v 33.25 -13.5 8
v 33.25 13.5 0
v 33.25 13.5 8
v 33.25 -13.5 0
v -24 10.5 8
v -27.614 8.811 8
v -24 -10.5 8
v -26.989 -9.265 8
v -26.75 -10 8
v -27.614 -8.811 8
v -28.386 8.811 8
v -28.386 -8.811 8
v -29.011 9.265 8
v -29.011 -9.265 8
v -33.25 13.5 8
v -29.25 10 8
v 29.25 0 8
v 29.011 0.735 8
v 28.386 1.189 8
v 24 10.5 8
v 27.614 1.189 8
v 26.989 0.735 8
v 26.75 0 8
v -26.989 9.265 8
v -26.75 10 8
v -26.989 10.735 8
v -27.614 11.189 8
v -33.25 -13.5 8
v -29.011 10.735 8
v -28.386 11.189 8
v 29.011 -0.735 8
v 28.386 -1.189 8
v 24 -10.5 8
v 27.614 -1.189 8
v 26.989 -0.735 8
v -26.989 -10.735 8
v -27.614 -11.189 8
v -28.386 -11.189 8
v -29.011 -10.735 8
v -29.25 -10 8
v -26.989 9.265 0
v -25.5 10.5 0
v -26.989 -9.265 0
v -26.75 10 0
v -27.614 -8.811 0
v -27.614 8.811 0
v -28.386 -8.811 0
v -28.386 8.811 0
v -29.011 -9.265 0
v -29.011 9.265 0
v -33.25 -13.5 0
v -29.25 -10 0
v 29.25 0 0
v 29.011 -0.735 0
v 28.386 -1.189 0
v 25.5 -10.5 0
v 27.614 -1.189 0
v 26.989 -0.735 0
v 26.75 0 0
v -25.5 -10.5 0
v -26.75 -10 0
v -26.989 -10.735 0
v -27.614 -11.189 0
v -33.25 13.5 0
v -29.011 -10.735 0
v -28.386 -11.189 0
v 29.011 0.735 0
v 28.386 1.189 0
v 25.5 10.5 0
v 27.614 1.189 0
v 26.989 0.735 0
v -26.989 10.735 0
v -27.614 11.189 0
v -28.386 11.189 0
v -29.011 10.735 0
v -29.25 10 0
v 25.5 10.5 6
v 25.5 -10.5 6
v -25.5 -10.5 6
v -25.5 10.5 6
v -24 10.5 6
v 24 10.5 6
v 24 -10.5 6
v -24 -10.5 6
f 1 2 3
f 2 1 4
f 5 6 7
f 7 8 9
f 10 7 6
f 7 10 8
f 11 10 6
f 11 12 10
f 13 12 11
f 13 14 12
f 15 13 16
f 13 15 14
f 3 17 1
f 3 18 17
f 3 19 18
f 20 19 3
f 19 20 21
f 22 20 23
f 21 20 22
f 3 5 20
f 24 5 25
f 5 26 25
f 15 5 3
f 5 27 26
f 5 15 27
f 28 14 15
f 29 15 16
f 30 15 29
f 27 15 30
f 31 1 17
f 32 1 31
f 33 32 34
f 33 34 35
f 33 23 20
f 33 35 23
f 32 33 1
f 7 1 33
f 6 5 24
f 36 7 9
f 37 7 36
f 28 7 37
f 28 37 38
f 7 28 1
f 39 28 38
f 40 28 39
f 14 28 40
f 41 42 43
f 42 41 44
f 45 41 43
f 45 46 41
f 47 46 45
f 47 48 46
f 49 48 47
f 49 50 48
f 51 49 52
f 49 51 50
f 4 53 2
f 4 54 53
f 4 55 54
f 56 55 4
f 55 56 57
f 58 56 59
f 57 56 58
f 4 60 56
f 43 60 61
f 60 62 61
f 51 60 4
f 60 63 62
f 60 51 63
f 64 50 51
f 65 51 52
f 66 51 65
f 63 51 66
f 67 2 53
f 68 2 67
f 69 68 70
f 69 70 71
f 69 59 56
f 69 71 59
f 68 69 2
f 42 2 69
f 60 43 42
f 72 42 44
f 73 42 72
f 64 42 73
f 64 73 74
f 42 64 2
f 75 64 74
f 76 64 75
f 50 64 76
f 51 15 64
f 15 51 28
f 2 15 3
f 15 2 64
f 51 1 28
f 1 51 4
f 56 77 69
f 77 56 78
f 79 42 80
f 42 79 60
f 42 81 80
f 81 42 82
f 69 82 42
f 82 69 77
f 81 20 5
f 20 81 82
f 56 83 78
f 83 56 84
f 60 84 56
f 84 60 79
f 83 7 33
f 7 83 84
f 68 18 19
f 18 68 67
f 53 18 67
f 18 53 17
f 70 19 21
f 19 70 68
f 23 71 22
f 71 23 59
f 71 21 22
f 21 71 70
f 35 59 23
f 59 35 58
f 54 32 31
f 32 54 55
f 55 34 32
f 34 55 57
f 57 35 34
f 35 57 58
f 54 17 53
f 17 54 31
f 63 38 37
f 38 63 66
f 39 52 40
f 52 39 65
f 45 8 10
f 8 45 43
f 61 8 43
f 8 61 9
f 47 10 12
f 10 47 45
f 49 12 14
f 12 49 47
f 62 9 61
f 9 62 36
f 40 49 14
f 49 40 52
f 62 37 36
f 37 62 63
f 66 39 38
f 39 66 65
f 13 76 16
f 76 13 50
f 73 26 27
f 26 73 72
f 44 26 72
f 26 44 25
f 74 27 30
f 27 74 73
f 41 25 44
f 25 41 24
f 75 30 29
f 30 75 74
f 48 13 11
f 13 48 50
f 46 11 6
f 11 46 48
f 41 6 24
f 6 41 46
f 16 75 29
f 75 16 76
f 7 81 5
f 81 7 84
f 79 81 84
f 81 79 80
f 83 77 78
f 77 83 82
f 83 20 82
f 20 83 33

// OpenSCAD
// focusing mirror mount, mirror size: 50 x 20

$fa = 6;  // make holes roundish
$fs = 0.8;

difference(){
translate([0,0,4])
cube([66.5, 27, 8], center = true);
    translate([0,0,4])
    cube([51,21,10], center = true);
    translate([28,0,4])
    cylinder(10,d = 2.5, center = true);
        translate([-28,-10,4])
    cylinder(10,d = 2.5, center = true);
           translate([-28,10,4])
    cylinder(10,d = 2.5, center = true);
}
translate([-25,0,7])
cube([2,22,2], center = true);
translate([25,0,7])
cube([2,22,2], center = true);
